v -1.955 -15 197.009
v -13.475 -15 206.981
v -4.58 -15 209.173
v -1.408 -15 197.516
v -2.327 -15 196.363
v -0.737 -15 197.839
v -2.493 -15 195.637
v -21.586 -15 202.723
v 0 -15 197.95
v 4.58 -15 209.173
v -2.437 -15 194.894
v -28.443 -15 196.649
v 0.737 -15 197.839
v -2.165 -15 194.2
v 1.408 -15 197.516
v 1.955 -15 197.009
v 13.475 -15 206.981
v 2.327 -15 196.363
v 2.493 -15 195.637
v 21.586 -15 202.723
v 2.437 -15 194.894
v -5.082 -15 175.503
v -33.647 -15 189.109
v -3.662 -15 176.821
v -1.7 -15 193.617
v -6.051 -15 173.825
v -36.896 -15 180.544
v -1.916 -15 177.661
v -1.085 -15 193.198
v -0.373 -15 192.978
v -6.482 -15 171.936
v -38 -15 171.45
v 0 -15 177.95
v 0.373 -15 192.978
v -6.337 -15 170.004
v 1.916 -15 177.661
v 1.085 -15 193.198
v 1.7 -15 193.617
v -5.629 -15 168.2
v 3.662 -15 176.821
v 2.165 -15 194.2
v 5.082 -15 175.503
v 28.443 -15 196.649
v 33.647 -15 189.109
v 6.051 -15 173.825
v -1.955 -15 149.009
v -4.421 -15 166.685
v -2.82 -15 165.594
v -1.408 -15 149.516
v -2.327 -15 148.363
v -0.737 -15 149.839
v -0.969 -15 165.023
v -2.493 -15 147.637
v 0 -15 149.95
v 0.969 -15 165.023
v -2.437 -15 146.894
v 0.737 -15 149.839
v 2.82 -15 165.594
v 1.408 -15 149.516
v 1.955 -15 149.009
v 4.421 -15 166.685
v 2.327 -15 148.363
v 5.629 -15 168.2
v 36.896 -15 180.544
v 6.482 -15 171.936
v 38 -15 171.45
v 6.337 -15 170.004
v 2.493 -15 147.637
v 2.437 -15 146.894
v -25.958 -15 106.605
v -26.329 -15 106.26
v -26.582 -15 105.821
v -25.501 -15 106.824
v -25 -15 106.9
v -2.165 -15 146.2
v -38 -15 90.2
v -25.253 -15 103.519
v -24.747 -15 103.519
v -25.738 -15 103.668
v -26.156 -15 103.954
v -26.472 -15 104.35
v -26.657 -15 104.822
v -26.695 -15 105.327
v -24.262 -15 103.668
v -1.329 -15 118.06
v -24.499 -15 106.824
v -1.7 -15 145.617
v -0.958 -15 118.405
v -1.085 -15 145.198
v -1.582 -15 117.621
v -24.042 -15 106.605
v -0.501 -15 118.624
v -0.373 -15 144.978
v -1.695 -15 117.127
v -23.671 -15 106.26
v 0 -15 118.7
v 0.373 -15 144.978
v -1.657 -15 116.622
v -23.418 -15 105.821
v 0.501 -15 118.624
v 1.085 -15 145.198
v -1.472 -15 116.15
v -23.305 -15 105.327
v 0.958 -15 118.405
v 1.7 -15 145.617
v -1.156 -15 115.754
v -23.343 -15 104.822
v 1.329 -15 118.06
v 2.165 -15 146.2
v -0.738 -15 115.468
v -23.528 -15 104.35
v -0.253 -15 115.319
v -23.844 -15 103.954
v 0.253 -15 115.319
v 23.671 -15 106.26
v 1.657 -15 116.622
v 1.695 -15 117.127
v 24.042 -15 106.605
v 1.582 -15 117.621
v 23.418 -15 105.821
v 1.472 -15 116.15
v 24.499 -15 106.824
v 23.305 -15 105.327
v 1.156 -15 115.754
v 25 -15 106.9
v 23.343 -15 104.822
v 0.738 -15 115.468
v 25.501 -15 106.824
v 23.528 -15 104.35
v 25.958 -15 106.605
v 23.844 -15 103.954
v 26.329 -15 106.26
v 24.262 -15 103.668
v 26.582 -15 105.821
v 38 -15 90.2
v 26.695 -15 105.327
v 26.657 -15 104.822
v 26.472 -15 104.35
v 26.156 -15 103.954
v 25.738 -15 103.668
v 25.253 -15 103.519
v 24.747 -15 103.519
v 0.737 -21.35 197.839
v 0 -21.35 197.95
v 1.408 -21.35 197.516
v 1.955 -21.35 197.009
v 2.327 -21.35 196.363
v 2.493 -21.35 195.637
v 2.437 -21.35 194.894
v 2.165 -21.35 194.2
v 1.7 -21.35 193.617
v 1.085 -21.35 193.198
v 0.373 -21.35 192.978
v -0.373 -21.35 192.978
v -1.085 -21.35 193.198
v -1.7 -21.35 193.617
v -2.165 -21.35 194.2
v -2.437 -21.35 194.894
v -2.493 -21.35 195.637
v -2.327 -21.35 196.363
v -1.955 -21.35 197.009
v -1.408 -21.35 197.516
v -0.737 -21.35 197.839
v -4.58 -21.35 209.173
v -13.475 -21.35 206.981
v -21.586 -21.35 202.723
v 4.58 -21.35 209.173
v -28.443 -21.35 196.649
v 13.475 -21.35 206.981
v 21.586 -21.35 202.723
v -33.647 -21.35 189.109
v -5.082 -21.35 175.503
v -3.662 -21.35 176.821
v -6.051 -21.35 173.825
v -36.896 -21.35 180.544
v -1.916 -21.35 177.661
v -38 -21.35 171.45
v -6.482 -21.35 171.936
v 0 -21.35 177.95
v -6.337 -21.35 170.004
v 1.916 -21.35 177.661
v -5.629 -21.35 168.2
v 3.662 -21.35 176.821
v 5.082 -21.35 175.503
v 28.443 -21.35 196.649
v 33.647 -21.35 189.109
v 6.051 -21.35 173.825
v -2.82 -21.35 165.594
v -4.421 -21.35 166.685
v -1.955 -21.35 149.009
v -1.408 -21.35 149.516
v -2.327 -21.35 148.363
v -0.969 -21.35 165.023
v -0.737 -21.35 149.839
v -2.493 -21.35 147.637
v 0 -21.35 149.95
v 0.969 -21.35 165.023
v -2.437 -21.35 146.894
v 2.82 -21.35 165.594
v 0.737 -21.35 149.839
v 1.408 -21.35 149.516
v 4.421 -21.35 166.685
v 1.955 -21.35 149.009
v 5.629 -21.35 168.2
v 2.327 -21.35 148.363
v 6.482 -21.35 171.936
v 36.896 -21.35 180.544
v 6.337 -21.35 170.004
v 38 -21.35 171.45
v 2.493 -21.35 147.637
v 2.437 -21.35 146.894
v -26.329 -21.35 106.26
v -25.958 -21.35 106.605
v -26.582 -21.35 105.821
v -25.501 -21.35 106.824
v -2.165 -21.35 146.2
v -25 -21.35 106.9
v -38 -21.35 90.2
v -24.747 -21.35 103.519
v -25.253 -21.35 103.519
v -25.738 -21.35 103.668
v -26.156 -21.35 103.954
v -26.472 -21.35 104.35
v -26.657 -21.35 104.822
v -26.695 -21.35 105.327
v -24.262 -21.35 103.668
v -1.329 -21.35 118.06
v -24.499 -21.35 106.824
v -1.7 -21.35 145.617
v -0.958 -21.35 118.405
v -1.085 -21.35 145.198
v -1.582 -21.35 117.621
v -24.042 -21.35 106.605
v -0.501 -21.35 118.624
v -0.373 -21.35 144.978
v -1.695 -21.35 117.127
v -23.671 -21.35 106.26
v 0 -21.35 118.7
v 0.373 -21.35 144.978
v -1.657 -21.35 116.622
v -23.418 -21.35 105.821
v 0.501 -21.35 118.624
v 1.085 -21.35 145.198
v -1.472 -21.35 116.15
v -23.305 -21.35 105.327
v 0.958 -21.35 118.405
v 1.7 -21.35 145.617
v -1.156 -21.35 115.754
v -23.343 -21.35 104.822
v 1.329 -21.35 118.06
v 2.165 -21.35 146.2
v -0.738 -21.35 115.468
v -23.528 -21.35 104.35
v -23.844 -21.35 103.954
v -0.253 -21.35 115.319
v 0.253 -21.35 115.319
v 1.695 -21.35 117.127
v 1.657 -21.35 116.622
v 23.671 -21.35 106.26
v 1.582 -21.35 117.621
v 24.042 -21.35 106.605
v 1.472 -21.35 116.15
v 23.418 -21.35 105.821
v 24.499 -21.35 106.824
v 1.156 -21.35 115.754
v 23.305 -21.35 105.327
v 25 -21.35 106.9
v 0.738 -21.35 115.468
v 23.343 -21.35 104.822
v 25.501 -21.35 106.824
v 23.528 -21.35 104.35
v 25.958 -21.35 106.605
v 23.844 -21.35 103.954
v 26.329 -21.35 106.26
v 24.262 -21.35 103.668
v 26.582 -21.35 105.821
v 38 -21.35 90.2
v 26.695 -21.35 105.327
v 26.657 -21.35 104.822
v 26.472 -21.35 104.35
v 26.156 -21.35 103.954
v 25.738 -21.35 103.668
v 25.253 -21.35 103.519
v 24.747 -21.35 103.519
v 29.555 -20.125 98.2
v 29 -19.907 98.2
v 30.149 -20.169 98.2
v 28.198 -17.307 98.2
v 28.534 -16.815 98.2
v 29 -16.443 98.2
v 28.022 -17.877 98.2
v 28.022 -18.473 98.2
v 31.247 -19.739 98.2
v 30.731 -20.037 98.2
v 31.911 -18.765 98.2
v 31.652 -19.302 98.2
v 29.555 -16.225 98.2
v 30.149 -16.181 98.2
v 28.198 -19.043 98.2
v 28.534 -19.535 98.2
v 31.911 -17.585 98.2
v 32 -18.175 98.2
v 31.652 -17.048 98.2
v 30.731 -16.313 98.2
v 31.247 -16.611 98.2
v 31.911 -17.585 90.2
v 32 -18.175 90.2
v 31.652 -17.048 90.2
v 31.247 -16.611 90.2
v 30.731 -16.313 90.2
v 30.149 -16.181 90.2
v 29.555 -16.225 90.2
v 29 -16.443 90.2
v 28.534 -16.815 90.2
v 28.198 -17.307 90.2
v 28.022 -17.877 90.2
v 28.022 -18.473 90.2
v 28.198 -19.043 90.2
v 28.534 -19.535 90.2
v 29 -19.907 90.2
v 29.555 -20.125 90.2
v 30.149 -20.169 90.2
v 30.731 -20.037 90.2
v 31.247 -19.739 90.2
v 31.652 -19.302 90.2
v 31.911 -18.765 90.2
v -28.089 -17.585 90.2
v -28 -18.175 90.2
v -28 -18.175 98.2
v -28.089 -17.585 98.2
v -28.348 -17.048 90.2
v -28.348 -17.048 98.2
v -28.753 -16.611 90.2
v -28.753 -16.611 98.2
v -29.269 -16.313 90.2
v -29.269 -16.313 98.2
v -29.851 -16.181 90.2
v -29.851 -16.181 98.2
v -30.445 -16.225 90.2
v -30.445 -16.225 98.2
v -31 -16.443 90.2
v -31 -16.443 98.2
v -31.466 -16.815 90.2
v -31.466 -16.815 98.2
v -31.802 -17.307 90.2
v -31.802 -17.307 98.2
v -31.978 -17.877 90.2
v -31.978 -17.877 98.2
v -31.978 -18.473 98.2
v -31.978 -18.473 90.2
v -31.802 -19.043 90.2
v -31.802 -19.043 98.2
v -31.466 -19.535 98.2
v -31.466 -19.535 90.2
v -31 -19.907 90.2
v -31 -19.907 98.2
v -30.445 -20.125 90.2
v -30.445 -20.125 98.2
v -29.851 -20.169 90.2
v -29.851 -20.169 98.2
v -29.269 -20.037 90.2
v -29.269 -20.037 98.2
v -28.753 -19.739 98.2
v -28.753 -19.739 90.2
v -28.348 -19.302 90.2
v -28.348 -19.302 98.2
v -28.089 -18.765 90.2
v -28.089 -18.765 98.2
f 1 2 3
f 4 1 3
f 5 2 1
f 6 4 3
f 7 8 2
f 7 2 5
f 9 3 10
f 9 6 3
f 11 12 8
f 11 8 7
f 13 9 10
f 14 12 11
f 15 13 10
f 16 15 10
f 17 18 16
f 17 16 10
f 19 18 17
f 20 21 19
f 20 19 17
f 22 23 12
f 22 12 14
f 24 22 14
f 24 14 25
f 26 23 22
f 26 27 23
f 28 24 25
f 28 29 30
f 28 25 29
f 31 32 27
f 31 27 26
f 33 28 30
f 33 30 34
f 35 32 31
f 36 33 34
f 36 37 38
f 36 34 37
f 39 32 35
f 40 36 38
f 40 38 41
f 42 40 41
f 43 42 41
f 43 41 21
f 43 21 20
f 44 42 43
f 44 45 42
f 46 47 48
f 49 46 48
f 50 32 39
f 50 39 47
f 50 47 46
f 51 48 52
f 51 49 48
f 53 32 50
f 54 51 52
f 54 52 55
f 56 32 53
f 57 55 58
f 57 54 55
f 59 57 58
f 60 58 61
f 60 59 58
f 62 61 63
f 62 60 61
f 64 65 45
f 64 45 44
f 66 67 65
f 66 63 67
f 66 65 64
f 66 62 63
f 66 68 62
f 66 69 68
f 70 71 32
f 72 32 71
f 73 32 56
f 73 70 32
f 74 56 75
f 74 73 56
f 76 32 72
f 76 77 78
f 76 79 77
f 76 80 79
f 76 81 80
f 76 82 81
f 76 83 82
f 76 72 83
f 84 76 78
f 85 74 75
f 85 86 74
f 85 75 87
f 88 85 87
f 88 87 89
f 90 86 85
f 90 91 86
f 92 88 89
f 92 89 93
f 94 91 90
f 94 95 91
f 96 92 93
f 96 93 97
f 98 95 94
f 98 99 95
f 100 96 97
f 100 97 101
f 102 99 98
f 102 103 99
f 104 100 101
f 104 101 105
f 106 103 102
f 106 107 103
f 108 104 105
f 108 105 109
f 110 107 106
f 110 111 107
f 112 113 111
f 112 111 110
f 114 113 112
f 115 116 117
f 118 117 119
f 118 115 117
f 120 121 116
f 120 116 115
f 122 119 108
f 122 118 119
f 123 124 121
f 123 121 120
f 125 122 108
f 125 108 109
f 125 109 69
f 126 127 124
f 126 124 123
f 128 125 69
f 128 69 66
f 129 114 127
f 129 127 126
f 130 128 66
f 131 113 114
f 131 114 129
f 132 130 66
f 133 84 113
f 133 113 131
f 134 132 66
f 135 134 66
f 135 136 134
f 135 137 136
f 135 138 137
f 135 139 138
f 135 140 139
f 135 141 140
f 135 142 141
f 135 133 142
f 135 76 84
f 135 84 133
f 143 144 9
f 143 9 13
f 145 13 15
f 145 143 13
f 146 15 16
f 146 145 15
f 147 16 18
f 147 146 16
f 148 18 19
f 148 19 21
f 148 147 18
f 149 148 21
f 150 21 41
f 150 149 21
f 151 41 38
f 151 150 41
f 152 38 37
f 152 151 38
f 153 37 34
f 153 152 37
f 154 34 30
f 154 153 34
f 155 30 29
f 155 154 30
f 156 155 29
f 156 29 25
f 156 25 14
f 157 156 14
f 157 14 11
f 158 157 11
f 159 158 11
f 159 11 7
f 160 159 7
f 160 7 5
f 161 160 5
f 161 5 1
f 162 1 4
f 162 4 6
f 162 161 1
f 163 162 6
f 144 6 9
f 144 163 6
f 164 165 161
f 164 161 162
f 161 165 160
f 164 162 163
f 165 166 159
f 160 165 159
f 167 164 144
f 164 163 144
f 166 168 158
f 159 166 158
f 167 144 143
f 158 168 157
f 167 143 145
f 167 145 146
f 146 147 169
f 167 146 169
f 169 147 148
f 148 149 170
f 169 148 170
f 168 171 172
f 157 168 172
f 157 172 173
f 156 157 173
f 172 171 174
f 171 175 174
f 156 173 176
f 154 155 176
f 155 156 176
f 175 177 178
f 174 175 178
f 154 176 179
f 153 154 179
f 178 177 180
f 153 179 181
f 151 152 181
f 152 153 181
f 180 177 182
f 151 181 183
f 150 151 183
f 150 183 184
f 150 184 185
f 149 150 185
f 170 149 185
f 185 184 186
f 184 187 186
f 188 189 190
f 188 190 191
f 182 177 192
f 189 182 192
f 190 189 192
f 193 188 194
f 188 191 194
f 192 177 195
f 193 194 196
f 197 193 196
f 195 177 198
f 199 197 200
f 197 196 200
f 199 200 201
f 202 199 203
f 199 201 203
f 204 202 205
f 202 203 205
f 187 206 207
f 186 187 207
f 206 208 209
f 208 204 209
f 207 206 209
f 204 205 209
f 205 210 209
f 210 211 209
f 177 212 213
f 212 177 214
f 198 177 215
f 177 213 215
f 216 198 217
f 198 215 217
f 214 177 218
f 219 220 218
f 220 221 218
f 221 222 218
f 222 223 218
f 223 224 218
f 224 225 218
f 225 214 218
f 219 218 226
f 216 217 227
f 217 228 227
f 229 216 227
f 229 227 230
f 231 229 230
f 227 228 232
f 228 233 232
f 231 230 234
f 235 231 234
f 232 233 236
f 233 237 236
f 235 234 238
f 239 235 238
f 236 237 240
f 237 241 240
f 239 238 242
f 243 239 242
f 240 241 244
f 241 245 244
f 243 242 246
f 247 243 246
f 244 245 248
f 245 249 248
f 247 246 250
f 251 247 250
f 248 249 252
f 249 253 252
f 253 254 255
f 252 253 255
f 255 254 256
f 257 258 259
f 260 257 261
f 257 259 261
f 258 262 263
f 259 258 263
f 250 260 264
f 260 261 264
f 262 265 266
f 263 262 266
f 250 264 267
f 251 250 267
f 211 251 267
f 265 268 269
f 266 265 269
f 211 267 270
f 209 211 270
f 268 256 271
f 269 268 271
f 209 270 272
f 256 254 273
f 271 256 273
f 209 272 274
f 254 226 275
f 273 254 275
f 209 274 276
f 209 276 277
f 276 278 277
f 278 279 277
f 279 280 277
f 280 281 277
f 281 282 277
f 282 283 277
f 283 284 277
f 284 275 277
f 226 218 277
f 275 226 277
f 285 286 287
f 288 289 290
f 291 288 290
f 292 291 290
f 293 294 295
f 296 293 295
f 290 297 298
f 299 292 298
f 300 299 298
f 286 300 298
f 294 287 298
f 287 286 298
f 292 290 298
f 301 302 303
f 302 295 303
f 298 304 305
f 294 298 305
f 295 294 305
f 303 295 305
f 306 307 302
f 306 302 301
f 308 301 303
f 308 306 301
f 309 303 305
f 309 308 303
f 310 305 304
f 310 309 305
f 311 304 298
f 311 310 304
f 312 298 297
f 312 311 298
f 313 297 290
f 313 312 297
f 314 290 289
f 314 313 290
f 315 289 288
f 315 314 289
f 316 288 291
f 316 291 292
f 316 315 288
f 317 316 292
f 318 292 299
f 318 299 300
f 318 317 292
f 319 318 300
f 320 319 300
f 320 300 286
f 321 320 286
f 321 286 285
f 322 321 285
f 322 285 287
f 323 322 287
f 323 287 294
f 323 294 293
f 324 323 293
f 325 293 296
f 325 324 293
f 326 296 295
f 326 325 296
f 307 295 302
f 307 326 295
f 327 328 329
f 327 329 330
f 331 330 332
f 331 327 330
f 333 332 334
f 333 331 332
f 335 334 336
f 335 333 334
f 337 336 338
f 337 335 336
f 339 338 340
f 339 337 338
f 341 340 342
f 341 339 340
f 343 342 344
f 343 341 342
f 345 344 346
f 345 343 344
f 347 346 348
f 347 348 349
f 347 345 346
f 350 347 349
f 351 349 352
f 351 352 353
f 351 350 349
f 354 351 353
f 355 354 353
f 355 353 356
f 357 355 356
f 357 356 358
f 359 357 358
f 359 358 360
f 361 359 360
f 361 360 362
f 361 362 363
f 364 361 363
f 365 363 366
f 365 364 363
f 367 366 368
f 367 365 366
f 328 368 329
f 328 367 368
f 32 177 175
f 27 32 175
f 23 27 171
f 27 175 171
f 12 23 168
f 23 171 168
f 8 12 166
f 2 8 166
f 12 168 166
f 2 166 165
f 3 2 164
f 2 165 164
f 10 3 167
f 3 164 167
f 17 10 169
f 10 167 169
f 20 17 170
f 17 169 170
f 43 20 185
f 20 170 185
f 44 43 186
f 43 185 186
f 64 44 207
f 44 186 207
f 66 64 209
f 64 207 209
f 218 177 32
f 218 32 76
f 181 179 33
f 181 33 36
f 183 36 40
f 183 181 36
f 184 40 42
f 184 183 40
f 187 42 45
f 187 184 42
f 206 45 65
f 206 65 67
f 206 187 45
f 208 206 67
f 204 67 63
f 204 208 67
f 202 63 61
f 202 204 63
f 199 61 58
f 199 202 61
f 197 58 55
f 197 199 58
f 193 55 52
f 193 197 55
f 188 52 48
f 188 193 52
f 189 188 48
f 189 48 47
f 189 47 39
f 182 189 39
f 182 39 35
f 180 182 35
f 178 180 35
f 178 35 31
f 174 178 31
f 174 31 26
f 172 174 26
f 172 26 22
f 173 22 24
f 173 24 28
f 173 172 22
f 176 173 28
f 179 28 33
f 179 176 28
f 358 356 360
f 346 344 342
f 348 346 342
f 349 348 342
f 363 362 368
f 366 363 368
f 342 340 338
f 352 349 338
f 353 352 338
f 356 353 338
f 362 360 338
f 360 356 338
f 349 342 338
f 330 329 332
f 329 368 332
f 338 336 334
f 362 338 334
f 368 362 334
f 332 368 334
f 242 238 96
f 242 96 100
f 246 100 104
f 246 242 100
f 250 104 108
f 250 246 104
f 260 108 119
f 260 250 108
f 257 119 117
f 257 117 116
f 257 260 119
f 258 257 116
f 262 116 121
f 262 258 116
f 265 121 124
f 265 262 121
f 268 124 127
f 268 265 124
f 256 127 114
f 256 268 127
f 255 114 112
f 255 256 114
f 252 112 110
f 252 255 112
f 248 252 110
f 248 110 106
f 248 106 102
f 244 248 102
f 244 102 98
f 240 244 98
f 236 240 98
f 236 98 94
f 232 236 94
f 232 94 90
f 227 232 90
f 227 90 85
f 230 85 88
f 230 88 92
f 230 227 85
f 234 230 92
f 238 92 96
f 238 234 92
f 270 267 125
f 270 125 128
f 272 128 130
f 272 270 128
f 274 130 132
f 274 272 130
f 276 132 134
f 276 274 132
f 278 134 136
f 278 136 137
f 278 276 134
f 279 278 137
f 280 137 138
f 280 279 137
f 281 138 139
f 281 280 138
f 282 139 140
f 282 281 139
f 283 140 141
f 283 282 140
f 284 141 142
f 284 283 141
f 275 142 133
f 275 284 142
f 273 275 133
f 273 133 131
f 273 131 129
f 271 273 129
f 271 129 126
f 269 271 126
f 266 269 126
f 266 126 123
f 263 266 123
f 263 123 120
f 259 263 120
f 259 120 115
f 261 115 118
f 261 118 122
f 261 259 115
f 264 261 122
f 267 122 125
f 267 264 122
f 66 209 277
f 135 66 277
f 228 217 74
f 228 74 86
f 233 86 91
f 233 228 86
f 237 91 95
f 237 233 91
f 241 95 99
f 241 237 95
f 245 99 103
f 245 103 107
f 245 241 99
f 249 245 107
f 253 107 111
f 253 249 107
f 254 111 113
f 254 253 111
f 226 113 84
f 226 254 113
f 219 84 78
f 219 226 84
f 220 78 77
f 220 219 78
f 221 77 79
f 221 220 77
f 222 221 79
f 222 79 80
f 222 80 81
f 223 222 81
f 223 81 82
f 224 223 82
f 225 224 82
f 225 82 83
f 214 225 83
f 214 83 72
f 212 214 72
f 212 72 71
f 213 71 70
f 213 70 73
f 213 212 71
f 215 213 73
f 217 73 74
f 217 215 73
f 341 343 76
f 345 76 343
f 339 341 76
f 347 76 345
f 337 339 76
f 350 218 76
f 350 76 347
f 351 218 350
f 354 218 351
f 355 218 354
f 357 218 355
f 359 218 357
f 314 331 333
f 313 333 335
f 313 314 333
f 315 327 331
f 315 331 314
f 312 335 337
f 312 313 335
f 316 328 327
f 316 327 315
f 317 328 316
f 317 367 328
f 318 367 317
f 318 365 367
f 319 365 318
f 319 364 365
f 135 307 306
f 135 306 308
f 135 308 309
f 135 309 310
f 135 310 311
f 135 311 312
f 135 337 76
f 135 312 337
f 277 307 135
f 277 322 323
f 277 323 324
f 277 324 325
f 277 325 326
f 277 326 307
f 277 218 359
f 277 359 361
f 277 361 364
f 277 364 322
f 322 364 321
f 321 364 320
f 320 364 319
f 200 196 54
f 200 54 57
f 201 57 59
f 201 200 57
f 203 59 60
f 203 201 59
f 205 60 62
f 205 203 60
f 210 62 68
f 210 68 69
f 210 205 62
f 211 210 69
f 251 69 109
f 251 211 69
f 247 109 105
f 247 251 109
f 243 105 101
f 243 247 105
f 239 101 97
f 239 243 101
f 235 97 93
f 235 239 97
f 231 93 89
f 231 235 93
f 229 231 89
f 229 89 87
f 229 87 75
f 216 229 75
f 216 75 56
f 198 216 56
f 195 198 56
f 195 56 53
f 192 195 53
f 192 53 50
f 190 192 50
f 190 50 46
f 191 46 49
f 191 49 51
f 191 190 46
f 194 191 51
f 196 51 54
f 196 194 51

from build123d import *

# Parameters (mm, degrees)
PARED_B_CHUMACERA_J2_START          = -21.35
CROQUIS1_W                          = 76
CROQUIS1_H                          = 81.25
PARED_B_CHUMACERA_J2_DEPTH          = 6.35
PARED_B_CHUMACERA_J2_REDONDEO_START = -21.35
CROQUIS2_R                          = 38
PARED_B_CHUMACERA_J2_REDONDEO_DEPTH = 6.35
PASO_PERNO_Y_ROSCA_M6_KFL001_START  = -21.35
CROQUIS3_R                          = 6.5
CROQUIS3_R_2                        = 2.5
PASO_PERNO_Y_ROSCA_M6_KFL001_DEPTH  = 6.35
ROSCA_M3_ESCUADRAS_START            = -21.35
CROQUIS4_R                          = 1.25
ROSCA_M3_ESCUADRAS_DEPTH            = 6.35
PASADORES_D4_START                  = 90.2
CROQUIS5_R                          = 2
PASADORES_D4_DEPTH                  = 8
ROSCA_M3_BASES_CINCHO_START         = -21.35
CROQUIS6_R                          = 1.25
ROSCA_M3_BASES_CINCHO_DEPTH         = 6.35
PASO_M3_ESCUADRAS_TUERCA_START      = -21.35
CROQUIS7_R                          = 1.7
PASO_M3_ESCUADRAS_TUERCA_DEPTH      = 6.35
PASO_M3_BASE_CINCHO_TUERCA_START    = -21.35
CROQUIS8_R                          = 1.7
PASO_M3_BASE_CINCHO_TUERCA_DEPTH    = 6.35


with BuildPart() as part:
    # Croquis1 → Pared_B_chumacera_J2 (new body)
    with BuildSketch(Plane(origin=(0, 0, 0), x_dir=(1, 0, 0), z_dir=(0, 1, 0)).offset(PARED_B_CHUMACERA_J2_START)):
        with Locations((0, -130.825)):
            Rectangle(CROQUIS1_W, CROQUIS1_H)
    extrude(amount=PARED_B_CHUMACERA_J2_DEPTH)

    # Croquis2 → Pared_B_chumacera_J2_redondeo (add)
    with BuildSketch(Plane(origin=(0, 0, 0), x_dir=(1, 0, 0), z_dir=(0, 1, 0)).offset(PARED_B_CHUMACERA_J2_REDONDEO_START)):
        with Locations((0, -171.45)):
            Circle(CROQUIS2_R)
    extrude(amount=PARED_B_CHUMACERA_J2_REDONDEO_DEPTH)

    # Croquis3 → Paso_perno_y_rosca_M6_KFL001 (cut)
    with BuildSketch(Plane(origin=(0, 0, 0), x_dir=(1, 0, 0), z_dir=(0, 1, 0)).offset(PASO_PERNO_Y_ROSCA_M6_KFL001_START)):
        with Locations(Location((0, -171.45, 0), (0, 0, 270))):
            Circle(CROQUIS3_R)
        with Locations(Location((0, -195.45, 0), (0, 0, 270))):
            Circle(CROQUIS3_R_2)
        with Locations(Location((0, -147.45, 0), (0, 0, 270))):
            Circle(CROQUIS3_R_2)
    extrude(amount=PASO_PERNO_Y_ROSCA_M6_KFL001_DEPTH, mode=Mode.SUBTRACT)

    # Croquis4 → Rosca_M3_escuadras (cut)
    with BuildSketch(Plane(origin=(0, 0, 0), x_dir=(1, 0, 0), z_dir=(0, 1, 0)).offset(ROSCA_M3_ESCUADRAS_START)):
        with Locations(Location((-25, -105.2, 0), (0, 0, 270))):
            Circle(CROQUIS4_R)
        with Locations(Location((25, -105.2, 0), (0, 0, 270))):
            Circle(CROQUIS4_R)
    extrude(amount=ROSCA_M3_ESCUADRAS_DEPTH, mode=Mode.SUBTRACT)

    # Croquis5 → Pasadores_D4 (cut)
    with BuildSketch(Plane.XY.offset(PASADORES_D4_START)):
        with Locations((-30, -18.175)):
            Circle(CROQUIS5_R)
        with Locations((30, -18.175)):
            Circle(CROQUIS5_R)
    extrude(amount=PASADORES_D4_DEPTH, mode=Mode.SUBTRACT)

    # Croquis6 → Rosca_M3_bases_cincho (cut)
    with BuildSketch(Plane(origin=(0, 0, 0), x_dir=(1, 0, 0), z_dir=(0, 1, 0)).offset(ROSCA_M3_BASES_CINCHO_START)):
        with Locations(Location((0, -117, 0), (0, 0, 270))):
            Circle(CROQUIS6_R)
    extrude(amount=ROSCA_M3_BASES_CINCHO_DEPTH, mode=Mode.SUBTRACT)

    # Croquis7 → Paso_M3_escuadras_tuerca (cut)
    with BuildSketch(Plane(origin=(0, 0, 0), x_dir=(1, 0, 0), z_dir=(0, 1, 0)).offset(PASO_M3_ESCUADRAS_TUERCA_START)):
        with Locations(Location((-25, -105.2, 0), (0, 0, 270))):
            Circle(CROQUIS7_R)
        with Locations(Location((25, -105.2, 0), (0, 0, 270))):
            Circle(CROQUIS7_R)
    extrude(amount=PASO_M3_ESCUADRAS_TUERCA_DEPTH, mode=Mode.SUBTRACT)

    # Croquis8 → Paso_M3_base_cincho_tuerca (cut)
    with BuildSketch(Plane(origin=(0, 0, 0), x_dir=(1, 0, 0), z_dir=(0, 1, 0)).offset(PASO_M3_BASE_CINCHO_TUERCA_START)):
        with Locations(Location((0, -117, 0), (0, 0, 270))):
            Circle(CROQUIS8_R)
    extrude(amount=PASO_M3_BASE_CINCHO_TUERCA_DEPTH, mode=Mode.SUBTRACT)


solid = part.part
